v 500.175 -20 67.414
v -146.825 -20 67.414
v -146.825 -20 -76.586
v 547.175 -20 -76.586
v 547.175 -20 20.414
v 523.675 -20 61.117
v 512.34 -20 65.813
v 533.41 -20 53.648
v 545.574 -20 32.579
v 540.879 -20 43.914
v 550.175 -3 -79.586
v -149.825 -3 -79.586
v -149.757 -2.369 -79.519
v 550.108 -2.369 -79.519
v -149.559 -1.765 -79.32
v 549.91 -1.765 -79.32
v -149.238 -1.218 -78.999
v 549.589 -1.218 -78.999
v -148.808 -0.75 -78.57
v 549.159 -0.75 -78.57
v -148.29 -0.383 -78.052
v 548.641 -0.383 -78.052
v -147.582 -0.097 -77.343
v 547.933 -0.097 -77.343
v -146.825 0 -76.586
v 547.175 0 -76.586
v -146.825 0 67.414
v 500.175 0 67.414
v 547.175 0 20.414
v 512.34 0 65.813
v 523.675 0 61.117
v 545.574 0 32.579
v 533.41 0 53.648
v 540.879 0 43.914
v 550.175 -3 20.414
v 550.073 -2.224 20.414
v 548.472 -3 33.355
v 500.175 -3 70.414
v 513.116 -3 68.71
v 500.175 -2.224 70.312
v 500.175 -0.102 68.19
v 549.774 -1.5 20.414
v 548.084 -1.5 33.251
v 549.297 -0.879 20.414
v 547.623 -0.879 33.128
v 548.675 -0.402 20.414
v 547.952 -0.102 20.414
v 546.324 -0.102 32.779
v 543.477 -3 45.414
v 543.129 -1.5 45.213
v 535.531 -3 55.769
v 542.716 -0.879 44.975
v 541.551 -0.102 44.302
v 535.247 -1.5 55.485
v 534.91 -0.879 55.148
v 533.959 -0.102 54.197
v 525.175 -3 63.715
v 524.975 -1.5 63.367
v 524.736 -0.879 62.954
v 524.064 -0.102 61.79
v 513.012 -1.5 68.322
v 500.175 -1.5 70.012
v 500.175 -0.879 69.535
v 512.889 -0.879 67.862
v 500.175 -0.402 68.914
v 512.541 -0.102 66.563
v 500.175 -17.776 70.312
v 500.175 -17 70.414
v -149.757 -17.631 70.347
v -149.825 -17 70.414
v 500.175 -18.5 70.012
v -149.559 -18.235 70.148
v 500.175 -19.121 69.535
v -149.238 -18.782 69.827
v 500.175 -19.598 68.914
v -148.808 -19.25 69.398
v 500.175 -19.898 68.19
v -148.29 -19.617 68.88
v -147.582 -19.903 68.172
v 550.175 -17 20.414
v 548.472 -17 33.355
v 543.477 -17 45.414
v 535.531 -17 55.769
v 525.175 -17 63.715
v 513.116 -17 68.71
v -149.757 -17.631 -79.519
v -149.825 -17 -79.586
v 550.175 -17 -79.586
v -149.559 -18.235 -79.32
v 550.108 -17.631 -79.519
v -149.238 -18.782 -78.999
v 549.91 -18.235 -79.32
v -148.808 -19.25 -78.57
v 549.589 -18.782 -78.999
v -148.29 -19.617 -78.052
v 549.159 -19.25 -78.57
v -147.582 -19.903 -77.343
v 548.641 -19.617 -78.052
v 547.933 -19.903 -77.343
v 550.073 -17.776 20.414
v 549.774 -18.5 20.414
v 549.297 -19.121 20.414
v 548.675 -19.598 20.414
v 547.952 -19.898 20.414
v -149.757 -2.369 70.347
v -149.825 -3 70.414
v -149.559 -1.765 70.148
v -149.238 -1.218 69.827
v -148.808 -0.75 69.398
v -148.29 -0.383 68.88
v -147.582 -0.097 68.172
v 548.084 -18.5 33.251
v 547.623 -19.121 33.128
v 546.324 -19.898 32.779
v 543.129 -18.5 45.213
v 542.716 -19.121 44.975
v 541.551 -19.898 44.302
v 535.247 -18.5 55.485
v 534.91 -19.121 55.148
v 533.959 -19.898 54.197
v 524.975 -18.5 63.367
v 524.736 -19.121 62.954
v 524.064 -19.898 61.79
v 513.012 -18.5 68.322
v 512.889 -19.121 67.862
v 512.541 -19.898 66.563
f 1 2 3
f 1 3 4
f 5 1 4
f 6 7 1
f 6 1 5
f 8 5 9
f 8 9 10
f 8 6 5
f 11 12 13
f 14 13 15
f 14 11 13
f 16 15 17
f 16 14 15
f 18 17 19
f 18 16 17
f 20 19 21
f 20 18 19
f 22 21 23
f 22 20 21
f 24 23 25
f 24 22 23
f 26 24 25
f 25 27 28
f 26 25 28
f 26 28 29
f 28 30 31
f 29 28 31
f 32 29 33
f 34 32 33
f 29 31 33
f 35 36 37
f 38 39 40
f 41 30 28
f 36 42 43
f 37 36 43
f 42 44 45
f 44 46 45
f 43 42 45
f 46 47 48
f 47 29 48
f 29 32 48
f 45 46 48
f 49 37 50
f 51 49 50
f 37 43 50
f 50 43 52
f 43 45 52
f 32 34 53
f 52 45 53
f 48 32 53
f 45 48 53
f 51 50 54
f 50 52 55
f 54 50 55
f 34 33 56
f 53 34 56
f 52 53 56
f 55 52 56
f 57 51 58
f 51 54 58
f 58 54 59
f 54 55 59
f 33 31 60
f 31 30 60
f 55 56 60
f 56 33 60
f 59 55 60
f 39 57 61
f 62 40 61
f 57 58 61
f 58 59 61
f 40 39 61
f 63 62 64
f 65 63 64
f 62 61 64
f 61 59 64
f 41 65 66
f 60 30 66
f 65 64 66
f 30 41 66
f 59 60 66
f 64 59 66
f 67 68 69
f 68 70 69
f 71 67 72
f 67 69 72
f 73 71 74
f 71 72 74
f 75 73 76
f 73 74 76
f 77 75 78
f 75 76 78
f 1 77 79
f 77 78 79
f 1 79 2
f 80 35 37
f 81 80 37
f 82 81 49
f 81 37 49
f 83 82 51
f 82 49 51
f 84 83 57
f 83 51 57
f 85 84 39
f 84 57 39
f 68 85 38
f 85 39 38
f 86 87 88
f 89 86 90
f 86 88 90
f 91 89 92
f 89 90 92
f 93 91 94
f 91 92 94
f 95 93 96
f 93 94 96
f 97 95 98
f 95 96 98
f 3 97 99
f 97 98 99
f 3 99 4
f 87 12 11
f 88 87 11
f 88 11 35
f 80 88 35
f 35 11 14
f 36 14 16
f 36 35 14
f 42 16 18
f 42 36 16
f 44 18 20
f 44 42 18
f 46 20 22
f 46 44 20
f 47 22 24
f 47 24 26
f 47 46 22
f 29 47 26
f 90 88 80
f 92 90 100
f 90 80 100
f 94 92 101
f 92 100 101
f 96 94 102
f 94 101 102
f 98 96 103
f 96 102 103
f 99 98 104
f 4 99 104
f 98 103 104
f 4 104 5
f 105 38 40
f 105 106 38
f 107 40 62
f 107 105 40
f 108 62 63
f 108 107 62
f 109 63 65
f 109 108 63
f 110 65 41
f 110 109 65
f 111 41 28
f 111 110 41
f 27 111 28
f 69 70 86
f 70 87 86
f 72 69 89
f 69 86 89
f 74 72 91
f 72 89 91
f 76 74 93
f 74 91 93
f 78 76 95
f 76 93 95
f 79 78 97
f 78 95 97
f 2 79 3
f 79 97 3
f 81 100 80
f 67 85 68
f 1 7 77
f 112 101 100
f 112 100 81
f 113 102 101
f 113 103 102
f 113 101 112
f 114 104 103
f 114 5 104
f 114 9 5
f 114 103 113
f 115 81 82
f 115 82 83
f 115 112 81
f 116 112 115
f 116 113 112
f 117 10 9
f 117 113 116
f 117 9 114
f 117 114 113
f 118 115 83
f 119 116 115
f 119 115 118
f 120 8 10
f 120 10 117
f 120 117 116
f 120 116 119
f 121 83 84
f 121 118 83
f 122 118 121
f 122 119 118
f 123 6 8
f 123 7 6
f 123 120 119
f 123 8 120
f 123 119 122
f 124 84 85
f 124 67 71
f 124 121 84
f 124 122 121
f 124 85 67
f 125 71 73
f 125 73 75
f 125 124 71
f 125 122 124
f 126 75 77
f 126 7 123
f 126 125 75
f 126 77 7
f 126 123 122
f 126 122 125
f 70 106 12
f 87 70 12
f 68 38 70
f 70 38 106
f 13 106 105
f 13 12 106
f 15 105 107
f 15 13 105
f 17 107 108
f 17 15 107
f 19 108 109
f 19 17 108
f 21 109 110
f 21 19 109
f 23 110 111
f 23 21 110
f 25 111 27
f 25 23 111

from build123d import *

# Parameters (mm, degrees)
F1_DEPTH = 20
F4_R     = 3


with BuildPart() as f1:
    # F0 (on Front) → F1 (new body)
    with BuildSketch(Plane.XZ):
        with BuildLine():
            Line((500.175496, 70.414034), (-149.824504, 70.414034))
            Line((-149.824504, 70.414034), (-149.824504, -79.585966))
            Line((-149.824504, -79.585966), (550.175496, -79.585966))
            Line((550.175496, -79.585966), (550.175496, 20.414034))
            ThreePointArc((550.175496, 20.414034), (535.530836, 55.769373), (500.175496, 70.414034))
        make_face()
    extrude(amount=F1_DEPTH)

    # F4
    f4_edges = [f1.edges().sort_by_distance(p)[0] for p in [
        (175.175496, 0, 70.414034),
        (-149.824504, 0, -4.585966),
        (200.175496, 0, -79.585966),
        (550.175496, 0, -29.585966),
        (535.530836, 0, 55.769373),
        (175.175496, -20, 70.414034),
        (-149.824504, -20, -4.585966),
        (200.175496, -20, -79.585966),
        (550.175496, -20, -29.585966),
        (535.530836, -20, 55.769373),
    ]]
    fillet(f4_edges, radius=F4_R)


solid = f1.part
